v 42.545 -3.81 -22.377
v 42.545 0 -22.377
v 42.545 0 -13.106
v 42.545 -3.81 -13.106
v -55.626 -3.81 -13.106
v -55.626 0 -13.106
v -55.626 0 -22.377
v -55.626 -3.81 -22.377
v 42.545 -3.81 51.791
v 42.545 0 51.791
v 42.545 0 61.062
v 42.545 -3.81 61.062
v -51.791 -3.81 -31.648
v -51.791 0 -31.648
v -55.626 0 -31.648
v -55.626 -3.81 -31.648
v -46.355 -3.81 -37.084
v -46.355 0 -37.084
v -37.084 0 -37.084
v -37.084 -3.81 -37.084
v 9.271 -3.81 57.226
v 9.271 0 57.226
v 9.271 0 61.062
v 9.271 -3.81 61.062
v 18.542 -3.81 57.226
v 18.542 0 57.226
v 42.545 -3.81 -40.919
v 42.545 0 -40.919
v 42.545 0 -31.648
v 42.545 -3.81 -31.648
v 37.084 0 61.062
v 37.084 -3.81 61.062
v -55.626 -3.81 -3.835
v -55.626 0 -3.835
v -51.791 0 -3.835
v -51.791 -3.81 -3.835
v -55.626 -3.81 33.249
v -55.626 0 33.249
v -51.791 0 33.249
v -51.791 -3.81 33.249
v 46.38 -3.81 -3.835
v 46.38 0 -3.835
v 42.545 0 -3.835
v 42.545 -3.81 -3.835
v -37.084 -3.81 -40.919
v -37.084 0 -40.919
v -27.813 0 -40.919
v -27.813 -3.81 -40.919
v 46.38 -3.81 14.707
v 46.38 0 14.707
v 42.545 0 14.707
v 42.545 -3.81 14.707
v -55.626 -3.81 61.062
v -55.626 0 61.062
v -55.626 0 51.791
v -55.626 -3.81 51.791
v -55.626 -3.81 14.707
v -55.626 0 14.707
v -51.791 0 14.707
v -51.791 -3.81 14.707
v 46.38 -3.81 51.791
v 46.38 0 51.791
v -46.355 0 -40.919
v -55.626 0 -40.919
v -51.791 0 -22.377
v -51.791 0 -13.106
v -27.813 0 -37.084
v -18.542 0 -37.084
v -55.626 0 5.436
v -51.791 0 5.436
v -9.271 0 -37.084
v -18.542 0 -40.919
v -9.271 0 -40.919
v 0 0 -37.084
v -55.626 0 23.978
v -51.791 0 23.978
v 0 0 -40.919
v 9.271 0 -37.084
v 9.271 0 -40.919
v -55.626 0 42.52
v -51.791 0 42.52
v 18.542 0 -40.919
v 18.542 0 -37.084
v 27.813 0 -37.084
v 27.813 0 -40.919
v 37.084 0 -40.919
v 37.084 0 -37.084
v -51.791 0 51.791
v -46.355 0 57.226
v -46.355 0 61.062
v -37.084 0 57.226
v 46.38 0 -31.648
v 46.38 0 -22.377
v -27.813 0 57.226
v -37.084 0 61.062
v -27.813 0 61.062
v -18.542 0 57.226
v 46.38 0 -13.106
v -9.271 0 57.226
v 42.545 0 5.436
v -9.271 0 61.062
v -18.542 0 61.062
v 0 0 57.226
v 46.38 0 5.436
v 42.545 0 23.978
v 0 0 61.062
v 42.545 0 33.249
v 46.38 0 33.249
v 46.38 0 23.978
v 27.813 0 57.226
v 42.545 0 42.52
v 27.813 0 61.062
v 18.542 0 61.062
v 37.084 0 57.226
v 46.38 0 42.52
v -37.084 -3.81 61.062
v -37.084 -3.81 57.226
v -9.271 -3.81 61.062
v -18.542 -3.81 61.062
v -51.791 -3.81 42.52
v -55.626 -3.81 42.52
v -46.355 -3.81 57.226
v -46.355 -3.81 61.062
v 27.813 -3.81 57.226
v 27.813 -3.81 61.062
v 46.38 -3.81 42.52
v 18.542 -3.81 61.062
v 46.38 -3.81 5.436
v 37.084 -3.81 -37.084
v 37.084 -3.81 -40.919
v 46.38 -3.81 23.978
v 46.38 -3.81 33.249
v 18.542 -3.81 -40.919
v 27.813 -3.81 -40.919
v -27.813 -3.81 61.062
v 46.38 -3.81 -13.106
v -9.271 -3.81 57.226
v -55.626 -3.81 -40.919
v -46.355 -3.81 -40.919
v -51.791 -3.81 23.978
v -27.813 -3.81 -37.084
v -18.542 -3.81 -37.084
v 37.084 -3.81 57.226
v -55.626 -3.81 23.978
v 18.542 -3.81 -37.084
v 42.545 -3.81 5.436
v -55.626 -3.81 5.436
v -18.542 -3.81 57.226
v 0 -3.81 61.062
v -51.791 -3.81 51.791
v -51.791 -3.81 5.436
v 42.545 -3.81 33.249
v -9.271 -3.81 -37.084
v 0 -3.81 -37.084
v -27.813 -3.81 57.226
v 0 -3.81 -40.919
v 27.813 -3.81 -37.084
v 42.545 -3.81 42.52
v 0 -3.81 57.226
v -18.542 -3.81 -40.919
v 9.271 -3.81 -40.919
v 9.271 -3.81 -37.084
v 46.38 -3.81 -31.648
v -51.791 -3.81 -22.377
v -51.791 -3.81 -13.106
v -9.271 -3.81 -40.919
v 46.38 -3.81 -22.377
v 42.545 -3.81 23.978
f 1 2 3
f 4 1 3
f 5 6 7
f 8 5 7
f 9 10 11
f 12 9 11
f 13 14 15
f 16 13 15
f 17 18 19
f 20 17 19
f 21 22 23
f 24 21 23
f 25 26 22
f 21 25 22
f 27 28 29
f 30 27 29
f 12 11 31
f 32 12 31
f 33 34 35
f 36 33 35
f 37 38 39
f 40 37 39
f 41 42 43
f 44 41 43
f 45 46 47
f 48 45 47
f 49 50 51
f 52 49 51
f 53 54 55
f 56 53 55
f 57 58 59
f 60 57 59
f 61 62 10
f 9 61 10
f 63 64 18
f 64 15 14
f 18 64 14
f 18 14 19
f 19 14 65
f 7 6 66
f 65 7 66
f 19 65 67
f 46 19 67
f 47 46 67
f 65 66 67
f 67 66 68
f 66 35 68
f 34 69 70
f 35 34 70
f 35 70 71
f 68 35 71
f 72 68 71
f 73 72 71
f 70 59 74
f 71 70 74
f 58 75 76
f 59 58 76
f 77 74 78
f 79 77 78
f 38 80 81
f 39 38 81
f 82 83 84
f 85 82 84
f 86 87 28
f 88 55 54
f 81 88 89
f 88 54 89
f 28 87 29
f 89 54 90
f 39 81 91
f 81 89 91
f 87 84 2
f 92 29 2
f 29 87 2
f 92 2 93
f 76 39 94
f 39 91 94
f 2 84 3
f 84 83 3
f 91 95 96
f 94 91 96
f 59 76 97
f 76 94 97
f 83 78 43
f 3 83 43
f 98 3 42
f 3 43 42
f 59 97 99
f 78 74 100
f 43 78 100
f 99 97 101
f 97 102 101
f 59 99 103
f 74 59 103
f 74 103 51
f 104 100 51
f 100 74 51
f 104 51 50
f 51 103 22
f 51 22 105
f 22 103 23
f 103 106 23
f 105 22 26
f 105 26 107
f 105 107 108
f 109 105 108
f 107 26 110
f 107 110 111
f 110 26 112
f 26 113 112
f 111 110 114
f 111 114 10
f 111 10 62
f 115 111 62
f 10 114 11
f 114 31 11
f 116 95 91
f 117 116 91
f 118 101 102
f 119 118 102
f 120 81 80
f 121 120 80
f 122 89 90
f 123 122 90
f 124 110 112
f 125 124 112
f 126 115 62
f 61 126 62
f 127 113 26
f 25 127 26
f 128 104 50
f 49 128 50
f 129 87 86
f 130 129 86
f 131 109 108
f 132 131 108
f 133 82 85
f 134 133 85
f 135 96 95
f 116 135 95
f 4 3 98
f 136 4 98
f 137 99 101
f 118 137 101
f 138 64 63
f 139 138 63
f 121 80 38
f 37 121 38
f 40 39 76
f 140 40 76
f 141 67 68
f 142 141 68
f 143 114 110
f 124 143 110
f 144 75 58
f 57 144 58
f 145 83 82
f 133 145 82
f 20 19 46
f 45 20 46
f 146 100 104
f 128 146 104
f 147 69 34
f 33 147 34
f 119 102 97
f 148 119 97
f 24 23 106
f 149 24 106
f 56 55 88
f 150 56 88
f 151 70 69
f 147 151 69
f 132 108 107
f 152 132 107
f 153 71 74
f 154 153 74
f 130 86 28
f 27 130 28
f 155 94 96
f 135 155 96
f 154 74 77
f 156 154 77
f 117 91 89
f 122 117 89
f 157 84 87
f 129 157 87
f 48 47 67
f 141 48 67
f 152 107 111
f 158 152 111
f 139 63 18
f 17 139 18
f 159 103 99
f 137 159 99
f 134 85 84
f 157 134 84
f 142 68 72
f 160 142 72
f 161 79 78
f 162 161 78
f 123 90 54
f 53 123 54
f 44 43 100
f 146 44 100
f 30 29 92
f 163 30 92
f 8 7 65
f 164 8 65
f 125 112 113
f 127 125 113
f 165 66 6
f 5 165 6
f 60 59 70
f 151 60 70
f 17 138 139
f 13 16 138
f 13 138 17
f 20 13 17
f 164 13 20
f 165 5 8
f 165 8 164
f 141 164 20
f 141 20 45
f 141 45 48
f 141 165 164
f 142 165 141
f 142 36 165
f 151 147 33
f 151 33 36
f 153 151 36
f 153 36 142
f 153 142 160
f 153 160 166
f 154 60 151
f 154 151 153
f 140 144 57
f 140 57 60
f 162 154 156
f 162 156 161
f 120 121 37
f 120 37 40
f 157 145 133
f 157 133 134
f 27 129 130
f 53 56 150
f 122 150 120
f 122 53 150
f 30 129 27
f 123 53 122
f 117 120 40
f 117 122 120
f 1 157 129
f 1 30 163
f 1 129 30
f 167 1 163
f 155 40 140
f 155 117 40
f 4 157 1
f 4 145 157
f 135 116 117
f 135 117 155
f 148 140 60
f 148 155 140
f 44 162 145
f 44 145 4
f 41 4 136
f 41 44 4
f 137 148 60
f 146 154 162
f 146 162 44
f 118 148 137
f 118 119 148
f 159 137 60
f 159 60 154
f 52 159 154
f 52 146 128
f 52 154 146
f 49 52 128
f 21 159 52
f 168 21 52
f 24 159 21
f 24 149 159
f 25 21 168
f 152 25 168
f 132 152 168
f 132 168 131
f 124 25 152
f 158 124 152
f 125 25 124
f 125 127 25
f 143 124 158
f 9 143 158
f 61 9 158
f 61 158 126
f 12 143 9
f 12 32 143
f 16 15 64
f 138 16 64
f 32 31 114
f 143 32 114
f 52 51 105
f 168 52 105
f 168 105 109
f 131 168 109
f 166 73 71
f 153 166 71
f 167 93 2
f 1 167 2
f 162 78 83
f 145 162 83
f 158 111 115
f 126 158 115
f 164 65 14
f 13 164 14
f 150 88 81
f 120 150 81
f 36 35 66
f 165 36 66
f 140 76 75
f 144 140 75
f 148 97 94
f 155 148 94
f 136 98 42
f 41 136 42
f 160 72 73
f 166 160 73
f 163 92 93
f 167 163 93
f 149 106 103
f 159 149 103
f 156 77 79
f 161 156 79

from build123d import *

# Parameters (mm, degrees)
F1_DEPTH = 3.81


with BuildPart() as f1:
    # F0 (on Front) → F1 (new body)
    with BuildSketch(Plane.XZ):
        Polygon((-46.355, 61.0616), (-55.626, 61.0616), (-55.626, 51.7906), (-51.7906, 51.7906), (-51.7906, 42.5196), (-55.626, 42.5196), (-55.626, 33.2486), (-51.7906, 33.2486), (-51.7906, 23.9776), (-55.626, 23.9776), (-55.626, 14.7066), (-51.7906, 14.7066), (-51.7906, 5.4356), (-55.626, 5.4356), (-55.626, -3.8354), (-51.7906, -3.8354), (-51.7906, -13.1064), (-55.626, -13.1064), (-55.626, -22.3774), (-51.7906, -22.3774), (-51.7906, -31.6484), (-55.626, -31.6484), (-55.626, -40.9194), (-46.355, -40.9194), (-46.355, -37.084), (-37.084, -37.084), (-37.084, -40.9194), (-27.813, -40.9194), (-27.813, -37.084), (-18.542, -37.084), (-18.542, -40.9194), (-9.271, -40.9194), (-9.271, -37.084), (0, -37.084), (0, -40.9194), (9.271, -40.9194), (9.271, -37.084), (18.542, -37.084), (18.542, -40.9194), (27.813, -40.9194), (27.813, -37.084), (37.084, -37.084), (37.084, -40.9194), (42.545, -40.9194), (42.545, -31.6484), (46.3804, -31.6484), (46.3804, -22.3774), (42.545, -22.3774), (42.545, -13.1064), (46.3804, -13.1064), (46.3804, -3.8354), (42.545, -3.8354), (42.545, 5.4356), (46.3804, 5.4356), (46.3804, 14.7066), (42.545, 14.7066), (42.545, 23.9776), (46.3804, 23.9776), (46.3804, 33.2486), (42.545, 33.2486), (42.545, 42.5196), (46.3804, 42.5196), (46.3804, 51.7906), (42.545, 51.7906), (42.545, 61.0616), (37.084, 61.0616), (37.084, 57.2262), (27.813, 57.2262), (27.813, 61.0616), (18.542, 61.0616), (18.542, 57.2262), (9.271, 57.2262), (9.271, 61.0616), (0, 61.0616), (0, 57.2262), (-9.271, 57.2262), (-9.271, 61.0616), (-18.542, 61.0616), (-18.542, 57.2262), (-27.813, 57.2262), (-27.813, 61.0616), (-37.084, 61.0616), (-37.084, 57.2262), (-46.355, 57.2262), align=None)
    extrude(amount=F1_DEPTH)


solid = f1.part
